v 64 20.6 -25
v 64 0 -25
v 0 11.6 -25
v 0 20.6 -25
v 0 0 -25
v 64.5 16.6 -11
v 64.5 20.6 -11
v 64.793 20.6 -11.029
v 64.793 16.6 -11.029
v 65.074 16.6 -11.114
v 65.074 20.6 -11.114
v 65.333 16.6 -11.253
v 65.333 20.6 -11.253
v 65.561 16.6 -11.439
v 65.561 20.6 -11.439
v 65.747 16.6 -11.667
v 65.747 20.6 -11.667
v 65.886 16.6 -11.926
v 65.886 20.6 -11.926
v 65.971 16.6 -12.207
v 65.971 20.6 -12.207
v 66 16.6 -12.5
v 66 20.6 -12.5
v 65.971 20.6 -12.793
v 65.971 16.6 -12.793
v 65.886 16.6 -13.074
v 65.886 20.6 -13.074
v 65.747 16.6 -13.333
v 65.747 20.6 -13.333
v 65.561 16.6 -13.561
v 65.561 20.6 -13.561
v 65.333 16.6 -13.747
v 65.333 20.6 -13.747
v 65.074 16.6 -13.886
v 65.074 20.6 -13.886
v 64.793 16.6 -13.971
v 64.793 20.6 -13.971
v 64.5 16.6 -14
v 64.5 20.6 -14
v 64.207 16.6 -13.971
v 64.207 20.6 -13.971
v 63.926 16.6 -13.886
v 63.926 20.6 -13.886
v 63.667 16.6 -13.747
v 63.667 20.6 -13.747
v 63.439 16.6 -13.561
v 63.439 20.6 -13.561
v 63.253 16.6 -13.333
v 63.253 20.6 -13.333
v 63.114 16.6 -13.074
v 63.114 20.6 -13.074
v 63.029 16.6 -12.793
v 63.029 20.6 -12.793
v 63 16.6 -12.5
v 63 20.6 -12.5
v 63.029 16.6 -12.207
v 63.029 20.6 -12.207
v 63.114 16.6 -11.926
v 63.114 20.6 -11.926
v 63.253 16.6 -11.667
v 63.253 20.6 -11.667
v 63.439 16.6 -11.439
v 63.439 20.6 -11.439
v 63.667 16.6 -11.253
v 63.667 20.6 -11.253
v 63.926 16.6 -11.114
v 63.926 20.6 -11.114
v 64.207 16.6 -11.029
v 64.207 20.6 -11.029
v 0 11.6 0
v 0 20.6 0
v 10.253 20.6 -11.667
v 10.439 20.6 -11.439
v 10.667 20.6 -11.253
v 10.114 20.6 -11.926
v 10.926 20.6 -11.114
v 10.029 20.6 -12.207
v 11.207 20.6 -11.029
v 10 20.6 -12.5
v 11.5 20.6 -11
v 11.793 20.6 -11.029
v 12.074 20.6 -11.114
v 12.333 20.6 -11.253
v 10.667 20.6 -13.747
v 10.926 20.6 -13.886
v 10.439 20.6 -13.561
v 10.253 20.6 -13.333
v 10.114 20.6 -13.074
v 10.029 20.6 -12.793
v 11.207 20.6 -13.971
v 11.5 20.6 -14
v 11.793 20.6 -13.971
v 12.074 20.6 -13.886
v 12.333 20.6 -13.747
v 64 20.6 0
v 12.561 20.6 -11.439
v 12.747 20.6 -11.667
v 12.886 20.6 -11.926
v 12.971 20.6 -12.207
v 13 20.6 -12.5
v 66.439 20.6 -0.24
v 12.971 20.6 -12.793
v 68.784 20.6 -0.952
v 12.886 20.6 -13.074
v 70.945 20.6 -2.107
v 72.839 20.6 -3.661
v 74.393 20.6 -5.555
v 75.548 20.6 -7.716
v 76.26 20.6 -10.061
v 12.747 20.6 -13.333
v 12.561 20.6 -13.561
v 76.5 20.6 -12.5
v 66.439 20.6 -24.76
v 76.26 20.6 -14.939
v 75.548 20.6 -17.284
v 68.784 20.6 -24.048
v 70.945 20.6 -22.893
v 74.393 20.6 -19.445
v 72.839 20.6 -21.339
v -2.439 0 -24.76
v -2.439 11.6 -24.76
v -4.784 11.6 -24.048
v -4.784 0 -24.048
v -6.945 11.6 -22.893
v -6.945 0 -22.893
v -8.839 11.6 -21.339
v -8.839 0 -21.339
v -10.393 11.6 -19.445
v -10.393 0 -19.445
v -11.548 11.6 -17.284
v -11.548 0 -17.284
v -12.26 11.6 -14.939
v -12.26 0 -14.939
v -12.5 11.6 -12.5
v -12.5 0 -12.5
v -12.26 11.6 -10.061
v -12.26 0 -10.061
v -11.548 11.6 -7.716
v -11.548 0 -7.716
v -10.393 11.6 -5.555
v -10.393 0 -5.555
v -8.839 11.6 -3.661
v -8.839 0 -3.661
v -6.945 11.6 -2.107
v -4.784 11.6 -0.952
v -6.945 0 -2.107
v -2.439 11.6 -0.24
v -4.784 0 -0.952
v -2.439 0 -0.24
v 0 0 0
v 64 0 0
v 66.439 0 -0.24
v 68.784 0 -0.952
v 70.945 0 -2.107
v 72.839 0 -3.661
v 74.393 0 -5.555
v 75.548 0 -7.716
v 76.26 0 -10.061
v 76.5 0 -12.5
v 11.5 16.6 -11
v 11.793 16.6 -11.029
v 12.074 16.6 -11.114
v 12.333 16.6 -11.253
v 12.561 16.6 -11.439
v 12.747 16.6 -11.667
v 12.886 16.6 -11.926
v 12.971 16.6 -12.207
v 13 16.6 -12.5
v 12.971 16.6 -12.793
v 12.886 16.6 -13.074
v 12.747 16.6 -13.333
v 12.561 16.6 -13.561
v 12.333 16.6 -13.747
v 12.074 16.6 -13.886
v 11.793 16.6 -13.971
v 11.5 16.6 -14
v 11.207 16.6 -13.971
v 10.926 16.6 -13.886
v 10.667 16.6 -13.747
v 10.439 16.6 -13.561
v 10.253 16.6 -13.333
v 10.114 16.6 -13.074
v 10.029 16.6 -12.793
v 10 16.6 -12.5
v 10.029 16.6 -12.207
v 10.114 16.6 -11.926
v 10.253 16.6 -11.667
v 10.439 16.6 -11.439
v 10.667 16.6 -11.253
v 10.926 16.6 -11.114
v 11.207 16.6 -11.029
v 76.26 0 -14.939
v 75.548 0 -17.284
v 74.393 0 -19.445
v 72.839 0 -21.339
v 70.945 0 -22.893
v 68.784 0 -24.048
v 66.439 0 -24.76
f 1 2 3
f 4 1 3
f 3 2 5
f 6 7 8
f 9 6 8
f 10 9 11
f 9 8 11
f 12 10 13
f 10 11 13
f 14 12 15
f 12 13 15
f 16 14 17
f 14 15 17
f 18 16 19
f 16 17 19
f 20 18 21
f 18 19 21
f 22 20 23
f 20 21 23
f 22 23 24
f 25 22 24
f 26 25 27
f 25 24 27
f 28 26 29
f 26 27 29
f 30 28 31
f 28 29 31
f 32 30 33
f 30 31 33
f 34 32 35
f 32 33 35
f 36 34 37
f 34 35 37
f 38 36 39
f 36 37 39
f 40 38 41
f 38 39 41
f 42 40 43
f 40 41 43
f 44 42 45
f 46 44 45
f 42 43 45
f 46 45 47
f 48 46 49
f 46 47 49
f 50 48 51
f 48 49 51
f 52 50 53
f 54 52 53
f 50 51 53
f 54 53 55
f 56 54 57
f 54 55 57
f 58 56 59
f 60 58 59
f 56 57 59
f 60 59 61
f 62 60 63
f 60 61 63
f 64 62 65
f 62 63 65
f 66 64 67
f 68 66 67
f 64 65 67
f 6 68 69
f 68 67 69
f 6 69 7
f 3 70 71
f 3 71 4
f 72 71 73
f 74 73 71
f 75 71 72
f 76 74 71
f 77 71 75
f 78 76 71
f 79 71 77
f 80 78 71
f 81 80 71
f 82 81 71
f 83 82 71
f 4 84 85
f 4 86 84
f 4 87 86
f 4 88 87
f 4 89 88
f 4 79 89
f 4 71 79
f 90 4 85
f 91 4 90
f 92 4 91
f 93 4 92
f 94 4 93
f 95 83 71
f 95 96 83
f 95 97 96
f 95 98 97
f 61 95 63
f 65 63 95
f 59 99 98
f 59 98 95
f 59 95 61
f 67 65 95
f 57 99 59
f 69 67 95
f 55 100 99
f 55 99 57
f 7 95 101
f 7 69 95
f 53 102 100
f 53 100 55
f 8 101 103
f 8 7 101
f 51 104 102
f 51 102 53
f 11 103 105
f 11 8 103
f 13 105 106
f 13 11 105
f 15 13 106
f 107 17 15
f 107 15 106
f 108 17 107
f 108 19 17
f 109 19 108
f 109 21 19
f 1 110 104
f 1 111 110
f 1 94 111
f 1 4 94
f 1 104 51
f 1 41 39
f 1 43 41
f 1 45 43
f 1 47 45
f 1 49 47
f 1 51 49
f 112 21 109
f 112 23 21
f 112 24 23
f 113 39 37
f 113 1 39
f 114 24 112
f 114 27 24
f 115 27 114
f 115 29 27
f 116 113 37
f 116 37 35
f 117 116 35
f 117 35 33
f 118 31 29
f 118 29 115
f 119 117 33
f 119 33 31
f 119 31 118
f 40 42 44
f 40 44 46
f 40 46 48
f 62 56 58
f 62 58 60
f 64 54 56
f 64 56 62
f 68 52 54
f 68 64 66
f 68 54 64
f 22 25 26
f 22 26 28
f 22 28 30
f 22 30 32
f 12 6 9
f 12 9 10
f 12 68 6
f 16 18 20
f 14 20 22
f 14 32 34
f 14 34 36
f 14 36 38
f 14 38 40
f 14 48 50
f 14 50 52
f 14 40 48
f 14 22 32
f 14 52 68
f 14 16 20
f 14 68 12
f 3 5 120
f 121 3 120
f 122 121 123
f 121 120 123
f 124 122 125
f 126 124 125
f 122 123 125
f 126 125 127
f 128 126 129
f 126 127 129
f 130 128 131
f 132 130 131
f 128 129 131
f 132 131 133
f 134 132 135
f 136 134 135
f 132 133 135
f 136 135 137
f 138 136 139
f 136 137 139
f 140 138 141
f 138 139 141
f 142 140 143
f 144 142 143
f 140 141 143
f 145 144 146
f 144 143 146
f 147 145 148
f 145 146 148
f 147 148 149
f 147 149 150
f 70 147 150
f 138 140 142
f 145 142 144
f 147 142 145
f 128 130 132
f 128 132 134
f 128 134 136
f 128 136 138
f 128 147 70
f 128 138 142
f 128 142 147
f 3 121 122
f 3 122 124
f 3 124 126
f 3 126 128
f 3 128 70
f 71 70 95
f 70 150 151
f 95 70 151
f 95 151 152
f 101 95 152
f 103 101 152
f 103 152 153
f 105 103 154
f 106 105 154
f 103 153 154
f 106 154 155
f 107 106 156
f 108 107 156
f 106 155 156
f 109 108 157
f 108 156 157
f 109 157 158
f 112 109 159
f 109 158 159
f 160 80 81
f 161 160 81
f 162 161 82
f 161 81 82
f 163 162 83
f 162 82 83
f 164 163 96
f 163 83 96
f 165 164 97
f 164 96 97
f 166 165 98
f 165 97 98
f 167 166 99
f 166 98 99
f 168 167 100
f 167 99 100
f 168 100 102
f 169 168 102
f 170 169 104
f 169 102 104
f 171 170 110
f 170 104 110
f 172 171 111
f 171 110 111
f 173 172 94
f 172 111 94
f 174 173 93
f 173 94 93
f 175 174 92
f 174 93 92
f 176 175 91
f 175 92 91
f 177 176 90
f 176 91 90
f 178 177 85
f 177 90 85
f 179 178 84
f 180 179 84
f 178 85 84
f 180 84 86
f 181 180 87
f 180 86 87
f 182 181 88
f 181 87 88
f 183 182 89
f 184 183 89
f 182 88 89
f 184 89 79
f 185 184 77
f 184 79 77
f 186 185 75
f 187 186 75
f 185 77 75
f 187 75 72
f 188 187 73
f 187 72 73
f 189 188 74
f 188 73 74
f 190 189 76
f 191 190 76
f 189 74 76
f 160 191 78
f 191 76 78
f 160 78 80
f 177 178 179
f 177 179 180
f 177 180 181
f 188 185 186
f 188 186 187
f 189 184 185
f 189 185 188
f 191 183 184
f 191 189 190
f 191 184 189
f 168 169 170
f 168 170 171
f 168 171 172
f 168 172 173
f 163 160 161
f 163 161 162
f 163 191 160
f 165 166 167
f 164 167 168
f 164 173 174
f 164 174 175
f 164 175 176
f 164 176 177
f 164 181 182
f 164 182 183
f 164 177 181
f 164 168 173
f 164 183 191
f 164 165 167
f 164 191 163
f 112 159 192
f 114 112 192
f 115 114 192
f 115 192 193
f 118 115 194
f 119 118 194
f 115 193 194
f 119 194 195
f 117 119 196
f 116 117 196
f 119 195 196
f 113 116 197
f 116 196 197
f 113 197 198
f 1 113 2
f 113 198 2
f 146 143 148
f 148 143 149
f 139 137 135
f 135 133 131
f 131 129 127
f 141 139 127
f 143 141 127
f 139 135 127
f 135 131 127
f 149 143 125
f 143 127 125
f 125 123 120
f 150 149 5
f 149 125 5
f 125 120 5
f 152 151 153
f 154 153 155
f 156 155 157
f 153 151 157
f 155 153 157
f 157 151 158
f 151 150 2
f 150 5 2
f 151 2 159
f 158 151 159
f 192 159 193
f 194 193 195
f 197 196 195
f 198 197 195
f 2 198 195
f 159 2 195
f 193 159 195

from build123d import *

# Parameters (mm, degrees)
BOSS_EXTRUDE1_DEPTH = 20.6
CUT_EXTRUDE1_START  = -9
CUT_EXTRUDE1_DEPTH  = 9
SKETCH4_R           = 1.5
CUT_EXTRUDE2_DEPTH  = 4


with BuildPart() as part:
    # Sketch1 → Boss-Extrude1 (new body)
    with BuildSketch(Plane(origin=(0, 0, 0), x_dir=(1, 0, 0), z_dir=(0, 1, 0))):
        with BuildLine():
            ThreePointArc((0, 25), (-12.5, 12.5), (0, 0))
            Line((0, 0), (0, 25))
        make_face()
        with BuildLine():
            Line((0, 25), (0, 0))
            ThreePointArc((0, 0), (8.838834765, 3.661165235), (12.5, 12.5))
            ThreePointArc((12.5, 12.5), (8.838834765, 21.338834765), (0, 25))
        make_face()
        with BuildLine():
            ThreePointArc((12.5, 12.5), (8.838834765, 3.661165235), (0, 0))
            Line((0, 0), (64, 0))
            ThreePointArc((64, 0), (51.5, 12.5), (64, 25))
            Line((64, 25), (0, 25))
            ThreePointArc((0, 25), (8.838834765, 21.338834765), (12.5, 12.5))
        make_face()
        with BuildLine():
            ThreePointArc((64, 25), (51.5, 12.5), (64, 0))
            Line((64, 0), (64, 25))
        make_face()
        with BuildLine():
            Line((64, 25), (64, 0))
            ThreePointArc((64, 0), (72.838834765, 3.661165235), (76.5, 12.5))
            ThreePointArc((76.5, 12.5), (72.838834765, 21.338834765), (64, 25))
        make_face()
    extrude(amount=BOSS_EXTRUDE1_DEPTH)

    # Sketch3 → Cut-Extrude1 (cut)
    with BuildSketch(Plane(origin=(0, 20.6, 0), x_dir=(1, 0, 0), z_dir=(0, 1, 0)).offset(CUT_EXTRUDE1_START)):
        with BuildLine():
            Line((0, 0), (0, 25))
            ThreePointArc((0, 25), (-12.5, 12.5), (0, 0))
        make_face()
    extrude(amount=CUT_EXTRUDE1_DEPTH, mode=Mode.SUBTRACT)

    # Sketch4 → Cut-Extrude2 (cut)
    with BuildSketch(Plane(origin=(0, 20.6, 0), x_dir=(1, 0, 0), z_dir=(0, 1, 0))):
        with Locations(Location((64.5, 12.5, 0), (0, 0, 270))):
            Circle(SKETCH4_R)
        with Locations(Location((11.5, 12.5, 0), (0, 0, 270))):
            Circle(SKETCH4_R)
    extrude(amount=-CUT_EXTRUDE2_DEPTH, mode=Mode.SUBTRACT)


solid = part.part
